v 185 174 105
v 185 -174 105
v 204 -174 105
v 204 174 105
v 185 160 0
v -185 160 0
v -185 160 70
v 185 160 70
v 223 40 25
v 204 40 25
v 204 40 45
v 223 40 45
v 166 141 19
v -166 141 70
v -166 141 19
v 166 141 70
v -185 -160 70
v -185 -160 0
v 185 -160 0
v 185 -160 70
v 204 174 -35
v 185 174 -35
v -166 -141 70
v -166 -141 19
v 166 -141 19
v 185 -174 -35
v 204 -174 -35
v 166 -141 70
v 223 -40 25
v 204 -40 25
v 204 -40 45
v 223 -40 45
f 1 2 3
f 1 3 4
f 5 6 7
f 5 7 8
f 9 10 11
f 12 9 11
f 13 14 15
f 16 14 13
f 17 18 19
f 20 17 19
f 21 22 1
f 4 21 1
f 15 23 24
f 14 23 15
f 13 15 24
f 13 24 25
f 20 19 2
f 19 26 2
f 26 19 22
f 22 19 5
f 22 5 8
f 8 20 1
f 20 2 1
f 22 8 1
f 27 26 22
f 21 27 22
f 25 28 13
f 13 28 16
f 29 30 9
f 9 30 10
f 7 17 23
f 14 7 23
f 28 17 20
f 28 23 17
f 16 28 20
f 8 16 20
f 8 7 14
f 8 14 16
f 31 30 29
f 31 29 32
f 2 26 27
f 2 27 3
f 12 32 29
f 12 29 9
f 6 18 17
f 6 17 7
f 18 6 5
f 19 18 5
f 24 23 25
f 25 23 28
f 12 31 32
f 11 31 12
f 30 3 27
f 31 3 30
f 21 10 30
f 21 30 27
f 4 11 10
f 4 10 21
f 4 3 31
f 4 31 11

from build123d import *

# Parameters (mm, degrees)
F0_W     = 370
F0_H     = 320
F1_DEPTH = 70
F2_W     = 332
F2_H     = 282
F3_DEPTH = 51
F4_W     = 348
F4_H     = 140
F4_W_2   = 320
F4_H_2   = 70
F5_DEPTH = 19
F6_W     = 80
F6_H     = 20
F7_DEPTH = 19


with BuildPart() as f1:
    # F0 (on Top) → F1 (new body)
    with BuildSketch(Plane.XY):
        Rectangle(F0_W, F0_H)
    extrude(amount=F1_DEPTH)

    # F2 (on face) → F3 (cut)
    with BuildSketch(Plane.XY.offset(70)):
        Rectangle(F2_W, F2_H)
    extrude(amount=-F3_DEPTH, mode=Mode.SUBTRACT)

    # F4 (on face) → F5 (join)
    with BuildSketch(Plane.YZ.offset(185)):
        with Locations((0, 35)):
            Rectangle(F4_W, F4_H)
        with Locations((0, 35)):
            Rectangle(F4_W_2, F4_H_2, mode=Mode.SUBTRACT)
        with Locations((0, 35)):
            Rectangle(F4_W_2, F4_H_2)
    extrude(amount=F5_DEPTH)

    # F6 (on face) → F7 (join)
    with BuildSketch(Plane.YZ.offset(204)):
        with Locations((0, 35)):
            Rectangle(F6_W, F6_H)
    extrude(amount=F7_DEPTH)


solid = f1.part
